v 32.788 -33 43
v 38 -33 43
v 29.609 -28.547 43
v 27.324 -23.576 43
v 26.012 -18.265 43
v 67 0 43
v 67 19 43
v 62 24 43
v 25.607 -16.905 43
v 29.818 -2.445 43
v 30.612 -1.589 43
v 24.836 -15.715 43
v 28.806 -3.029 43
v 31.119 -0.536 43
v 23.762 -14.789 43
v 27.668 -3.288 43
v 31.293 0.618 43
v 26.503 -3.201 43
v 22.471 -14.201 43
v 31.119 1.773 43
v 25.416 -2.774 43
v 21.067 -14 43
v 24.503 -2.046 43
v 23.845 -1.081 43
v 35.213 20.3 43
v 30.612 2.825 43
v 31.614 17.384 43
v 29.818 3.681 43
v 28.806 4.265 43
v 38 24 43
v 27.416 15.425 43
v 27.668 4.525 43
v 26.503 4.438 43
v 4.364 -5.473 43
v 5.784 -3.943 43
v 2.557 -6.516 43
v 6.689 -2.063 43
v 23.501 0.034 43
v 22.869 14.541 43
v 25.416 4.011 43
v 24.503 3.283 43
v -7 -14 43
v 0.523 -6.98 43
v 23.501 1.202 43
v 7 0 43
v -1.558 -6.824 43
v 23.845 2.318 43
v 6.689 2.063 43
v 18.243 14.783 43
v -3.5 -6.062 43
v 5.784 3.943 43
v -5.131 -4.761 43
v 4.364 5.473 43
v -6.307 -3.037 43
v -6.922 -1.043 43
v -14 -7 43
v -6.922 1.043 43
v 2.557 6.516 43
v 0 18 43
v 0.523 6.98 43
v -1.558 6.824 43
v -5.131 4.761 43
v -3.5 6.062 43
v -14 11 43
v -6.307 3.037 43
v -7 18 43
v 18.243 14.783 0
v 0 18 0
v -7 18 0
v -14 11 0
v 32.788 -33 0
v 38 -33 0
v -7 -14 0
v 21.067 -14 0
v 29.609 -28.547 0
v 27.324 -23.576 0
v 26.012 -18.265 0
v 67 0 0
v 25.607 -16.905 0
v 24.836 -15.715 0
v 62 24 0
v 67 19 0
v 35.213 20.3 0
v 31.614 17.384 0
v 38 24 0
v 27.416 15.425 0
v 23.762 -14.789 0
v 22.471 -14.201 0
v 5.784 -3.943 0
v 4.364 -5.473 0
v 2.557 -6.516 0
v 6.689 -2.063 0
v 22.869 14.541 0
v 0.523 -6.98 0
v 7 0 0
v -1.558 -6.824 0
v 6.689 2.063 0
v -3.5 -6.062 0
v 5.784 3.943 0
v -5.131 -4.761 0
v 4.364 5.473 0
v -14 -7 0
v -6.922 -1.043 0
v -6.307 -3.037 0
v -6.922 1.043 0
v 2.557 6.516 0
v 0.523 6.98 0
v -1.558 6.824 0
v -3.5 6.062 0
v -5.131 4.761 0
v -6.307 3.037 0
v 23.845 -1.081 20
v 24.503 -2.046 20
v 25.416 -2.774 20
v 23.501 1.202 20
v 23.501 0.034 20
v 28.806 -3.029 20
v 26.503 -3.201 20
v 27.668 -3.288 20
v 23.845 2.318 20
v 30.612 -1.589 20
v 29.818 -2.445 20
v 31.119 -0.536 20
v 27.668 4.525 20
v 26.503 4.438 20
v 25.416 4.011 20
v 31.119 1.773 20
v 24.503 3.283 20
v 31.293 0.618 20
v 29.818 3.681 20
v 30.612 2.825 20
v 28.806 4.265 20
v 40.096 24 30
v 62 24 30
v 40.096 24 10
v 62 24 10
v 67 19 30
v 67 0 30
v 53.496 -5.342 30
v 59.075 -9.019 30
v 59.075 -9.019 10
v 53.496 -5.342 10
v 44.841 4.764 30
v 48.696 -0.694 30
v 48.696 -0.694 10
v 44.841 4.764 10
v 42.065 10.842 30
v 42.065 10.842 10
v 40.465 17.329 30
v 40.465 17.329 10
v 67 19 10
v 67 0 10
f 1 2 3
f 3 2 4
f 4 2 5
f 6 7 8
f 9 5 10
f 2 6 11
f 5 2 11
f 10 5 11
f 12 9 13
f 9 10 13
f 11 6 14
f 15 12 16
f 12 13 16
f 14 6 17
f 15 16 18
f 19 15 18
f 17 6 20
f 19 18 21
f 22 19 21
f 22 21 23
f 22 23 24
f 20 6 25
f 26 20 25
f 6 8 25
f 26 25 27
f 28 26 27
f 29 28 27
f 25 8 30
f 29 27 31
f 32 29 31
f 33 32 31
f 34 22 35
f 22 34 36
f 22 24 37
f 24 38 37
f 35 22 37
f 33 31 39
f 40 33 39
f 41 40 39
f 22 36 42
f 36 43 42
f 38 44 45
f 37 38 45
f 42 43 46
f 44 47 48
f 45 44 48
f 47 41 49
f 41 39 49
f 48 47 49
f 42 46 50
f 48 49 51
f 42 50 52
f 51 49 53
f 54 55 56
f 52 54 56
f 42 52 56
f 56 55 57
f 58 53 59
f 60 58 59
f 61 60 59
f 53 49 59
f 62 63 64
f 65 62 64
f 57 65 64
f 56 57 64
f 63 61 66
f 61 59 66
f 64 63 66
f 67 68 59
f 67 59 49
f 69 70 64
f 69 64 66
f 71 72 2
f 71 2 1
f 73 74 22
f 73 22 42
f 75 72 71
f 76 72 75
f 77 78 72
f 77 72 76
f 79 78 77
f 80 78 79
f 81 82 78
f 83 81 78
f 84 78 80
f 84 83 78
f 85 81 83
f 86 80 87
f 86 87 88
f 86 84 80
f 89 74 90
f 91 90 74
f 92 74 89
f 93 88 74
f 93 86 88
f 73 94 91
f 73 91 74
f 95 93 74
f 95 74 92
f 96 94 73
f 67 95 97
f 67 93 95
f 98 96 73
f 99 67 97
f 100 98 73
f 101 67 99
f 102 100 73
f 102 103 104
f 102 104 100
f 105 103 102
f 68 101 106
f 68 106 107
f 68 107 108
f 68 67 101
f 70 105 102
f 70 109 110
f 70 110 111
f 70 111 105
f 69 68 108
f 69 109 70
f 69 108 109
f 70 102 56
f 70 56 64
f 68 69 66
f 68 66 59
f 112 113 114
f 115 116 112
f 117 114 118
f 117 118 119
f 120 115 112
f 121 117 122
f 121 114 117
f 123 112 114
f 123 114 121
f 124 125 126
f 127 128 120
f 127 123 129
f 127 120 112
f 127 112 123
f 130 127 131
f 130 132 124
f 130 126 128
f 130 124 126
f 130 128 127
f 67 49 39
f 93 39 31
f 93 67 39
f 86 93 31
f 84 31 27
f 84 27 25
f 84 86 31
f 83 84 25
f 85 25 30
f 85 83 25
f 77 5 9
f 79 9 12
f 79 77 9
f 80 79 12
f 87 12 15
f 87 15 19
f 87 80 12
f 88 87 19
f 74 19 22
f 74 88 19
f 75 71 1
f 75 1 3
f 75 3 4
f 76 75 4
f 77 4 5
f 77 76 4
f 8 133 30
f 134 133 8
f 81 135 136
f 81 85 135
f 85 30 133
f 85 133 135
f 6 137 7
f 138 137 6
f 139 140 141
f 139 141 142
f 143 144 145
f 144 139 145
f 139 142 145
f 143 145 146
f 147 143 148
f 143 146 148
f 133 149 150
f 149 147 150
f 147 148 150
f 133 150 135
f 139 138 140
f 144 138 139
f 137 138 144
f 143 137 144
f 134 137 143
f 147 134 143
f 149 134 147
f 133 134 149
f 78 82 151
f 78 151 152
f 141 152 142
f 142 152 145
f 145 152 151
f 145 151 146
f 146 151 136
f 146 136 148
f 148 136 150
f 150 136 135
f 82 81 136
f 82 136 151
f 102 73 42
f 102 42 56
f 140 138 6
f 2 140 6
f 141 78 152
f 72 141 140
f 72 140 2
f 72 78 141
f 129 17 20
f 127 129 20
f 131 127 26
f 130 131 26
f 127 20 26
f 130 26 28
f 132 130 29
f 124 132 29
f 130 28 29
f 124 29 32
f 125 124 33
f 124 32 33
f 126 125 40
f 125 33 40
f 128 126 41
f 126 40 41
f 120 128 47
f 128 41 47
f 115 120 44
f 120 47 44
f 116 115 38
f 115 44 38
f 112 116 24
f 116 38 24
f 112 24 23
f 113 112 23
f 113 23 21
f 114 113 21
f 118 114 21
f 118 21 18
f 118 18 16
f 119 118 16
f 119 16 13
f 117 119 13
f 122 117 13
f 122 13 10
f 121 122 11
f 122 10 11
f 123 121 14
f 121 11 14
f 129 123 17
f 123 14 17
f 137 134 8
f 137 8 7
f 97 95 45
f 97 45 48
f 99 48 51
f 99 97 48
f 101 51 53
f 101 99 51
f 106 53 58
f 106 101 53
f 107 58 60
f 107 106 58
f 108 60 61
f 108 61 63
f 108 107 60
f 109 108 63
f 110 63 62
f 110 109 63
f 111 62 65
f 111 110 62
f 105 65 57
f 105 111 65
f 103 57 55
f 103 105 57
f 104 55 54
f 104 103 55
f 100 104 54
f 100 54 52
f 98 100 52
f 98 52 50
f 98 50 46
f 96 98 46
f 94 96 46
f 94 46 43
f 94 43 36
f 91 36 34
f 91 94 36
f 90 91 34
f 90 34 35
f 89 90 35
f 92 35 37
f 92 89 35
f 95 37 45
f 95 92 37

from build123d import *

# Parameters (mm, degrees)
SKETCH1_R           = 7
BOSS_EXTRUDE1_DEPTH = 43
CUT_EXTRUDE1_START  = -10
SKETCH2_R           = 35.868634871
CUT_EXTRUDE1_DEPTH  = 20
SKETCH3_R           = 3.917707096
CUT_EXTRUDE2_DEPTH  = 23


with BuildPart() as part:
    # Sketch1 → Boss-Extrude1 (new body)
    with BuildSketch(Plane.XY):
        with BuildLine():
            Line((-14, -7), (-14, 11))
            Line((-14, 11), (-7, 18))
            Line((-7, 18), (0, 18))
            Line((0, 18), (18.243084988, 14.783251905))
            ThreePointArc((18.243084988, 14.783251905), (29.574972961, 16.276069151), (38, 24))
            Line((38, 24), (62, 24))
            Line((62, 24), (67, 19))
            Line((67, 19), (67, 0))
            Line((67, 0), (38, -33))
            Line((38, -33), (32.788067397, -33))
            ThreePointArc((32.788067397, -33), (28.3490952, -26.115672061), (26.012264997, -18.264705882))
            ThreePointArc((26.012264997, -18.264705882), (24.331862036, -15.213413768), (21.066626255, -14))
            Line((21.066626255, -14), (-7, -14))
            Line((-7, -14), (-14, -7))
        make_face()
        Circle(SKETCH1_R, mode=Mode.SUBTRACT)
    extrude(amount=BOSS_EXTRUDE1_DEPTH)

    # Sketch2 → Cut-Extrude1 (cut)
    with BuildSketch(Plane(origin=(0, 0, 0), x_dir=(-1, 0, 0), z_dir=(0, 0, -1)).offset(CUT_EXTRUDE1_START)):
        with Locations((-75.938611571, 22.638320419)):
            Circle(SKETCH2_R)
    extrude(amount=-CUT_EXTRUDE1_DEPTH, mode=Mode.SUBTRACT)

    # Sketch3 → Cut-Extrude2 (cut)
    with BuildSketch(Plane.XY.offset(43)):
        with Locations((27.374932955, 0.618357786)):
            Circle(SKETCH3_R)
    extrude(amount=-CUT_EXTRUDE2_DEPTH, mode=Mode.SUBTRACT)


solid = part.part
